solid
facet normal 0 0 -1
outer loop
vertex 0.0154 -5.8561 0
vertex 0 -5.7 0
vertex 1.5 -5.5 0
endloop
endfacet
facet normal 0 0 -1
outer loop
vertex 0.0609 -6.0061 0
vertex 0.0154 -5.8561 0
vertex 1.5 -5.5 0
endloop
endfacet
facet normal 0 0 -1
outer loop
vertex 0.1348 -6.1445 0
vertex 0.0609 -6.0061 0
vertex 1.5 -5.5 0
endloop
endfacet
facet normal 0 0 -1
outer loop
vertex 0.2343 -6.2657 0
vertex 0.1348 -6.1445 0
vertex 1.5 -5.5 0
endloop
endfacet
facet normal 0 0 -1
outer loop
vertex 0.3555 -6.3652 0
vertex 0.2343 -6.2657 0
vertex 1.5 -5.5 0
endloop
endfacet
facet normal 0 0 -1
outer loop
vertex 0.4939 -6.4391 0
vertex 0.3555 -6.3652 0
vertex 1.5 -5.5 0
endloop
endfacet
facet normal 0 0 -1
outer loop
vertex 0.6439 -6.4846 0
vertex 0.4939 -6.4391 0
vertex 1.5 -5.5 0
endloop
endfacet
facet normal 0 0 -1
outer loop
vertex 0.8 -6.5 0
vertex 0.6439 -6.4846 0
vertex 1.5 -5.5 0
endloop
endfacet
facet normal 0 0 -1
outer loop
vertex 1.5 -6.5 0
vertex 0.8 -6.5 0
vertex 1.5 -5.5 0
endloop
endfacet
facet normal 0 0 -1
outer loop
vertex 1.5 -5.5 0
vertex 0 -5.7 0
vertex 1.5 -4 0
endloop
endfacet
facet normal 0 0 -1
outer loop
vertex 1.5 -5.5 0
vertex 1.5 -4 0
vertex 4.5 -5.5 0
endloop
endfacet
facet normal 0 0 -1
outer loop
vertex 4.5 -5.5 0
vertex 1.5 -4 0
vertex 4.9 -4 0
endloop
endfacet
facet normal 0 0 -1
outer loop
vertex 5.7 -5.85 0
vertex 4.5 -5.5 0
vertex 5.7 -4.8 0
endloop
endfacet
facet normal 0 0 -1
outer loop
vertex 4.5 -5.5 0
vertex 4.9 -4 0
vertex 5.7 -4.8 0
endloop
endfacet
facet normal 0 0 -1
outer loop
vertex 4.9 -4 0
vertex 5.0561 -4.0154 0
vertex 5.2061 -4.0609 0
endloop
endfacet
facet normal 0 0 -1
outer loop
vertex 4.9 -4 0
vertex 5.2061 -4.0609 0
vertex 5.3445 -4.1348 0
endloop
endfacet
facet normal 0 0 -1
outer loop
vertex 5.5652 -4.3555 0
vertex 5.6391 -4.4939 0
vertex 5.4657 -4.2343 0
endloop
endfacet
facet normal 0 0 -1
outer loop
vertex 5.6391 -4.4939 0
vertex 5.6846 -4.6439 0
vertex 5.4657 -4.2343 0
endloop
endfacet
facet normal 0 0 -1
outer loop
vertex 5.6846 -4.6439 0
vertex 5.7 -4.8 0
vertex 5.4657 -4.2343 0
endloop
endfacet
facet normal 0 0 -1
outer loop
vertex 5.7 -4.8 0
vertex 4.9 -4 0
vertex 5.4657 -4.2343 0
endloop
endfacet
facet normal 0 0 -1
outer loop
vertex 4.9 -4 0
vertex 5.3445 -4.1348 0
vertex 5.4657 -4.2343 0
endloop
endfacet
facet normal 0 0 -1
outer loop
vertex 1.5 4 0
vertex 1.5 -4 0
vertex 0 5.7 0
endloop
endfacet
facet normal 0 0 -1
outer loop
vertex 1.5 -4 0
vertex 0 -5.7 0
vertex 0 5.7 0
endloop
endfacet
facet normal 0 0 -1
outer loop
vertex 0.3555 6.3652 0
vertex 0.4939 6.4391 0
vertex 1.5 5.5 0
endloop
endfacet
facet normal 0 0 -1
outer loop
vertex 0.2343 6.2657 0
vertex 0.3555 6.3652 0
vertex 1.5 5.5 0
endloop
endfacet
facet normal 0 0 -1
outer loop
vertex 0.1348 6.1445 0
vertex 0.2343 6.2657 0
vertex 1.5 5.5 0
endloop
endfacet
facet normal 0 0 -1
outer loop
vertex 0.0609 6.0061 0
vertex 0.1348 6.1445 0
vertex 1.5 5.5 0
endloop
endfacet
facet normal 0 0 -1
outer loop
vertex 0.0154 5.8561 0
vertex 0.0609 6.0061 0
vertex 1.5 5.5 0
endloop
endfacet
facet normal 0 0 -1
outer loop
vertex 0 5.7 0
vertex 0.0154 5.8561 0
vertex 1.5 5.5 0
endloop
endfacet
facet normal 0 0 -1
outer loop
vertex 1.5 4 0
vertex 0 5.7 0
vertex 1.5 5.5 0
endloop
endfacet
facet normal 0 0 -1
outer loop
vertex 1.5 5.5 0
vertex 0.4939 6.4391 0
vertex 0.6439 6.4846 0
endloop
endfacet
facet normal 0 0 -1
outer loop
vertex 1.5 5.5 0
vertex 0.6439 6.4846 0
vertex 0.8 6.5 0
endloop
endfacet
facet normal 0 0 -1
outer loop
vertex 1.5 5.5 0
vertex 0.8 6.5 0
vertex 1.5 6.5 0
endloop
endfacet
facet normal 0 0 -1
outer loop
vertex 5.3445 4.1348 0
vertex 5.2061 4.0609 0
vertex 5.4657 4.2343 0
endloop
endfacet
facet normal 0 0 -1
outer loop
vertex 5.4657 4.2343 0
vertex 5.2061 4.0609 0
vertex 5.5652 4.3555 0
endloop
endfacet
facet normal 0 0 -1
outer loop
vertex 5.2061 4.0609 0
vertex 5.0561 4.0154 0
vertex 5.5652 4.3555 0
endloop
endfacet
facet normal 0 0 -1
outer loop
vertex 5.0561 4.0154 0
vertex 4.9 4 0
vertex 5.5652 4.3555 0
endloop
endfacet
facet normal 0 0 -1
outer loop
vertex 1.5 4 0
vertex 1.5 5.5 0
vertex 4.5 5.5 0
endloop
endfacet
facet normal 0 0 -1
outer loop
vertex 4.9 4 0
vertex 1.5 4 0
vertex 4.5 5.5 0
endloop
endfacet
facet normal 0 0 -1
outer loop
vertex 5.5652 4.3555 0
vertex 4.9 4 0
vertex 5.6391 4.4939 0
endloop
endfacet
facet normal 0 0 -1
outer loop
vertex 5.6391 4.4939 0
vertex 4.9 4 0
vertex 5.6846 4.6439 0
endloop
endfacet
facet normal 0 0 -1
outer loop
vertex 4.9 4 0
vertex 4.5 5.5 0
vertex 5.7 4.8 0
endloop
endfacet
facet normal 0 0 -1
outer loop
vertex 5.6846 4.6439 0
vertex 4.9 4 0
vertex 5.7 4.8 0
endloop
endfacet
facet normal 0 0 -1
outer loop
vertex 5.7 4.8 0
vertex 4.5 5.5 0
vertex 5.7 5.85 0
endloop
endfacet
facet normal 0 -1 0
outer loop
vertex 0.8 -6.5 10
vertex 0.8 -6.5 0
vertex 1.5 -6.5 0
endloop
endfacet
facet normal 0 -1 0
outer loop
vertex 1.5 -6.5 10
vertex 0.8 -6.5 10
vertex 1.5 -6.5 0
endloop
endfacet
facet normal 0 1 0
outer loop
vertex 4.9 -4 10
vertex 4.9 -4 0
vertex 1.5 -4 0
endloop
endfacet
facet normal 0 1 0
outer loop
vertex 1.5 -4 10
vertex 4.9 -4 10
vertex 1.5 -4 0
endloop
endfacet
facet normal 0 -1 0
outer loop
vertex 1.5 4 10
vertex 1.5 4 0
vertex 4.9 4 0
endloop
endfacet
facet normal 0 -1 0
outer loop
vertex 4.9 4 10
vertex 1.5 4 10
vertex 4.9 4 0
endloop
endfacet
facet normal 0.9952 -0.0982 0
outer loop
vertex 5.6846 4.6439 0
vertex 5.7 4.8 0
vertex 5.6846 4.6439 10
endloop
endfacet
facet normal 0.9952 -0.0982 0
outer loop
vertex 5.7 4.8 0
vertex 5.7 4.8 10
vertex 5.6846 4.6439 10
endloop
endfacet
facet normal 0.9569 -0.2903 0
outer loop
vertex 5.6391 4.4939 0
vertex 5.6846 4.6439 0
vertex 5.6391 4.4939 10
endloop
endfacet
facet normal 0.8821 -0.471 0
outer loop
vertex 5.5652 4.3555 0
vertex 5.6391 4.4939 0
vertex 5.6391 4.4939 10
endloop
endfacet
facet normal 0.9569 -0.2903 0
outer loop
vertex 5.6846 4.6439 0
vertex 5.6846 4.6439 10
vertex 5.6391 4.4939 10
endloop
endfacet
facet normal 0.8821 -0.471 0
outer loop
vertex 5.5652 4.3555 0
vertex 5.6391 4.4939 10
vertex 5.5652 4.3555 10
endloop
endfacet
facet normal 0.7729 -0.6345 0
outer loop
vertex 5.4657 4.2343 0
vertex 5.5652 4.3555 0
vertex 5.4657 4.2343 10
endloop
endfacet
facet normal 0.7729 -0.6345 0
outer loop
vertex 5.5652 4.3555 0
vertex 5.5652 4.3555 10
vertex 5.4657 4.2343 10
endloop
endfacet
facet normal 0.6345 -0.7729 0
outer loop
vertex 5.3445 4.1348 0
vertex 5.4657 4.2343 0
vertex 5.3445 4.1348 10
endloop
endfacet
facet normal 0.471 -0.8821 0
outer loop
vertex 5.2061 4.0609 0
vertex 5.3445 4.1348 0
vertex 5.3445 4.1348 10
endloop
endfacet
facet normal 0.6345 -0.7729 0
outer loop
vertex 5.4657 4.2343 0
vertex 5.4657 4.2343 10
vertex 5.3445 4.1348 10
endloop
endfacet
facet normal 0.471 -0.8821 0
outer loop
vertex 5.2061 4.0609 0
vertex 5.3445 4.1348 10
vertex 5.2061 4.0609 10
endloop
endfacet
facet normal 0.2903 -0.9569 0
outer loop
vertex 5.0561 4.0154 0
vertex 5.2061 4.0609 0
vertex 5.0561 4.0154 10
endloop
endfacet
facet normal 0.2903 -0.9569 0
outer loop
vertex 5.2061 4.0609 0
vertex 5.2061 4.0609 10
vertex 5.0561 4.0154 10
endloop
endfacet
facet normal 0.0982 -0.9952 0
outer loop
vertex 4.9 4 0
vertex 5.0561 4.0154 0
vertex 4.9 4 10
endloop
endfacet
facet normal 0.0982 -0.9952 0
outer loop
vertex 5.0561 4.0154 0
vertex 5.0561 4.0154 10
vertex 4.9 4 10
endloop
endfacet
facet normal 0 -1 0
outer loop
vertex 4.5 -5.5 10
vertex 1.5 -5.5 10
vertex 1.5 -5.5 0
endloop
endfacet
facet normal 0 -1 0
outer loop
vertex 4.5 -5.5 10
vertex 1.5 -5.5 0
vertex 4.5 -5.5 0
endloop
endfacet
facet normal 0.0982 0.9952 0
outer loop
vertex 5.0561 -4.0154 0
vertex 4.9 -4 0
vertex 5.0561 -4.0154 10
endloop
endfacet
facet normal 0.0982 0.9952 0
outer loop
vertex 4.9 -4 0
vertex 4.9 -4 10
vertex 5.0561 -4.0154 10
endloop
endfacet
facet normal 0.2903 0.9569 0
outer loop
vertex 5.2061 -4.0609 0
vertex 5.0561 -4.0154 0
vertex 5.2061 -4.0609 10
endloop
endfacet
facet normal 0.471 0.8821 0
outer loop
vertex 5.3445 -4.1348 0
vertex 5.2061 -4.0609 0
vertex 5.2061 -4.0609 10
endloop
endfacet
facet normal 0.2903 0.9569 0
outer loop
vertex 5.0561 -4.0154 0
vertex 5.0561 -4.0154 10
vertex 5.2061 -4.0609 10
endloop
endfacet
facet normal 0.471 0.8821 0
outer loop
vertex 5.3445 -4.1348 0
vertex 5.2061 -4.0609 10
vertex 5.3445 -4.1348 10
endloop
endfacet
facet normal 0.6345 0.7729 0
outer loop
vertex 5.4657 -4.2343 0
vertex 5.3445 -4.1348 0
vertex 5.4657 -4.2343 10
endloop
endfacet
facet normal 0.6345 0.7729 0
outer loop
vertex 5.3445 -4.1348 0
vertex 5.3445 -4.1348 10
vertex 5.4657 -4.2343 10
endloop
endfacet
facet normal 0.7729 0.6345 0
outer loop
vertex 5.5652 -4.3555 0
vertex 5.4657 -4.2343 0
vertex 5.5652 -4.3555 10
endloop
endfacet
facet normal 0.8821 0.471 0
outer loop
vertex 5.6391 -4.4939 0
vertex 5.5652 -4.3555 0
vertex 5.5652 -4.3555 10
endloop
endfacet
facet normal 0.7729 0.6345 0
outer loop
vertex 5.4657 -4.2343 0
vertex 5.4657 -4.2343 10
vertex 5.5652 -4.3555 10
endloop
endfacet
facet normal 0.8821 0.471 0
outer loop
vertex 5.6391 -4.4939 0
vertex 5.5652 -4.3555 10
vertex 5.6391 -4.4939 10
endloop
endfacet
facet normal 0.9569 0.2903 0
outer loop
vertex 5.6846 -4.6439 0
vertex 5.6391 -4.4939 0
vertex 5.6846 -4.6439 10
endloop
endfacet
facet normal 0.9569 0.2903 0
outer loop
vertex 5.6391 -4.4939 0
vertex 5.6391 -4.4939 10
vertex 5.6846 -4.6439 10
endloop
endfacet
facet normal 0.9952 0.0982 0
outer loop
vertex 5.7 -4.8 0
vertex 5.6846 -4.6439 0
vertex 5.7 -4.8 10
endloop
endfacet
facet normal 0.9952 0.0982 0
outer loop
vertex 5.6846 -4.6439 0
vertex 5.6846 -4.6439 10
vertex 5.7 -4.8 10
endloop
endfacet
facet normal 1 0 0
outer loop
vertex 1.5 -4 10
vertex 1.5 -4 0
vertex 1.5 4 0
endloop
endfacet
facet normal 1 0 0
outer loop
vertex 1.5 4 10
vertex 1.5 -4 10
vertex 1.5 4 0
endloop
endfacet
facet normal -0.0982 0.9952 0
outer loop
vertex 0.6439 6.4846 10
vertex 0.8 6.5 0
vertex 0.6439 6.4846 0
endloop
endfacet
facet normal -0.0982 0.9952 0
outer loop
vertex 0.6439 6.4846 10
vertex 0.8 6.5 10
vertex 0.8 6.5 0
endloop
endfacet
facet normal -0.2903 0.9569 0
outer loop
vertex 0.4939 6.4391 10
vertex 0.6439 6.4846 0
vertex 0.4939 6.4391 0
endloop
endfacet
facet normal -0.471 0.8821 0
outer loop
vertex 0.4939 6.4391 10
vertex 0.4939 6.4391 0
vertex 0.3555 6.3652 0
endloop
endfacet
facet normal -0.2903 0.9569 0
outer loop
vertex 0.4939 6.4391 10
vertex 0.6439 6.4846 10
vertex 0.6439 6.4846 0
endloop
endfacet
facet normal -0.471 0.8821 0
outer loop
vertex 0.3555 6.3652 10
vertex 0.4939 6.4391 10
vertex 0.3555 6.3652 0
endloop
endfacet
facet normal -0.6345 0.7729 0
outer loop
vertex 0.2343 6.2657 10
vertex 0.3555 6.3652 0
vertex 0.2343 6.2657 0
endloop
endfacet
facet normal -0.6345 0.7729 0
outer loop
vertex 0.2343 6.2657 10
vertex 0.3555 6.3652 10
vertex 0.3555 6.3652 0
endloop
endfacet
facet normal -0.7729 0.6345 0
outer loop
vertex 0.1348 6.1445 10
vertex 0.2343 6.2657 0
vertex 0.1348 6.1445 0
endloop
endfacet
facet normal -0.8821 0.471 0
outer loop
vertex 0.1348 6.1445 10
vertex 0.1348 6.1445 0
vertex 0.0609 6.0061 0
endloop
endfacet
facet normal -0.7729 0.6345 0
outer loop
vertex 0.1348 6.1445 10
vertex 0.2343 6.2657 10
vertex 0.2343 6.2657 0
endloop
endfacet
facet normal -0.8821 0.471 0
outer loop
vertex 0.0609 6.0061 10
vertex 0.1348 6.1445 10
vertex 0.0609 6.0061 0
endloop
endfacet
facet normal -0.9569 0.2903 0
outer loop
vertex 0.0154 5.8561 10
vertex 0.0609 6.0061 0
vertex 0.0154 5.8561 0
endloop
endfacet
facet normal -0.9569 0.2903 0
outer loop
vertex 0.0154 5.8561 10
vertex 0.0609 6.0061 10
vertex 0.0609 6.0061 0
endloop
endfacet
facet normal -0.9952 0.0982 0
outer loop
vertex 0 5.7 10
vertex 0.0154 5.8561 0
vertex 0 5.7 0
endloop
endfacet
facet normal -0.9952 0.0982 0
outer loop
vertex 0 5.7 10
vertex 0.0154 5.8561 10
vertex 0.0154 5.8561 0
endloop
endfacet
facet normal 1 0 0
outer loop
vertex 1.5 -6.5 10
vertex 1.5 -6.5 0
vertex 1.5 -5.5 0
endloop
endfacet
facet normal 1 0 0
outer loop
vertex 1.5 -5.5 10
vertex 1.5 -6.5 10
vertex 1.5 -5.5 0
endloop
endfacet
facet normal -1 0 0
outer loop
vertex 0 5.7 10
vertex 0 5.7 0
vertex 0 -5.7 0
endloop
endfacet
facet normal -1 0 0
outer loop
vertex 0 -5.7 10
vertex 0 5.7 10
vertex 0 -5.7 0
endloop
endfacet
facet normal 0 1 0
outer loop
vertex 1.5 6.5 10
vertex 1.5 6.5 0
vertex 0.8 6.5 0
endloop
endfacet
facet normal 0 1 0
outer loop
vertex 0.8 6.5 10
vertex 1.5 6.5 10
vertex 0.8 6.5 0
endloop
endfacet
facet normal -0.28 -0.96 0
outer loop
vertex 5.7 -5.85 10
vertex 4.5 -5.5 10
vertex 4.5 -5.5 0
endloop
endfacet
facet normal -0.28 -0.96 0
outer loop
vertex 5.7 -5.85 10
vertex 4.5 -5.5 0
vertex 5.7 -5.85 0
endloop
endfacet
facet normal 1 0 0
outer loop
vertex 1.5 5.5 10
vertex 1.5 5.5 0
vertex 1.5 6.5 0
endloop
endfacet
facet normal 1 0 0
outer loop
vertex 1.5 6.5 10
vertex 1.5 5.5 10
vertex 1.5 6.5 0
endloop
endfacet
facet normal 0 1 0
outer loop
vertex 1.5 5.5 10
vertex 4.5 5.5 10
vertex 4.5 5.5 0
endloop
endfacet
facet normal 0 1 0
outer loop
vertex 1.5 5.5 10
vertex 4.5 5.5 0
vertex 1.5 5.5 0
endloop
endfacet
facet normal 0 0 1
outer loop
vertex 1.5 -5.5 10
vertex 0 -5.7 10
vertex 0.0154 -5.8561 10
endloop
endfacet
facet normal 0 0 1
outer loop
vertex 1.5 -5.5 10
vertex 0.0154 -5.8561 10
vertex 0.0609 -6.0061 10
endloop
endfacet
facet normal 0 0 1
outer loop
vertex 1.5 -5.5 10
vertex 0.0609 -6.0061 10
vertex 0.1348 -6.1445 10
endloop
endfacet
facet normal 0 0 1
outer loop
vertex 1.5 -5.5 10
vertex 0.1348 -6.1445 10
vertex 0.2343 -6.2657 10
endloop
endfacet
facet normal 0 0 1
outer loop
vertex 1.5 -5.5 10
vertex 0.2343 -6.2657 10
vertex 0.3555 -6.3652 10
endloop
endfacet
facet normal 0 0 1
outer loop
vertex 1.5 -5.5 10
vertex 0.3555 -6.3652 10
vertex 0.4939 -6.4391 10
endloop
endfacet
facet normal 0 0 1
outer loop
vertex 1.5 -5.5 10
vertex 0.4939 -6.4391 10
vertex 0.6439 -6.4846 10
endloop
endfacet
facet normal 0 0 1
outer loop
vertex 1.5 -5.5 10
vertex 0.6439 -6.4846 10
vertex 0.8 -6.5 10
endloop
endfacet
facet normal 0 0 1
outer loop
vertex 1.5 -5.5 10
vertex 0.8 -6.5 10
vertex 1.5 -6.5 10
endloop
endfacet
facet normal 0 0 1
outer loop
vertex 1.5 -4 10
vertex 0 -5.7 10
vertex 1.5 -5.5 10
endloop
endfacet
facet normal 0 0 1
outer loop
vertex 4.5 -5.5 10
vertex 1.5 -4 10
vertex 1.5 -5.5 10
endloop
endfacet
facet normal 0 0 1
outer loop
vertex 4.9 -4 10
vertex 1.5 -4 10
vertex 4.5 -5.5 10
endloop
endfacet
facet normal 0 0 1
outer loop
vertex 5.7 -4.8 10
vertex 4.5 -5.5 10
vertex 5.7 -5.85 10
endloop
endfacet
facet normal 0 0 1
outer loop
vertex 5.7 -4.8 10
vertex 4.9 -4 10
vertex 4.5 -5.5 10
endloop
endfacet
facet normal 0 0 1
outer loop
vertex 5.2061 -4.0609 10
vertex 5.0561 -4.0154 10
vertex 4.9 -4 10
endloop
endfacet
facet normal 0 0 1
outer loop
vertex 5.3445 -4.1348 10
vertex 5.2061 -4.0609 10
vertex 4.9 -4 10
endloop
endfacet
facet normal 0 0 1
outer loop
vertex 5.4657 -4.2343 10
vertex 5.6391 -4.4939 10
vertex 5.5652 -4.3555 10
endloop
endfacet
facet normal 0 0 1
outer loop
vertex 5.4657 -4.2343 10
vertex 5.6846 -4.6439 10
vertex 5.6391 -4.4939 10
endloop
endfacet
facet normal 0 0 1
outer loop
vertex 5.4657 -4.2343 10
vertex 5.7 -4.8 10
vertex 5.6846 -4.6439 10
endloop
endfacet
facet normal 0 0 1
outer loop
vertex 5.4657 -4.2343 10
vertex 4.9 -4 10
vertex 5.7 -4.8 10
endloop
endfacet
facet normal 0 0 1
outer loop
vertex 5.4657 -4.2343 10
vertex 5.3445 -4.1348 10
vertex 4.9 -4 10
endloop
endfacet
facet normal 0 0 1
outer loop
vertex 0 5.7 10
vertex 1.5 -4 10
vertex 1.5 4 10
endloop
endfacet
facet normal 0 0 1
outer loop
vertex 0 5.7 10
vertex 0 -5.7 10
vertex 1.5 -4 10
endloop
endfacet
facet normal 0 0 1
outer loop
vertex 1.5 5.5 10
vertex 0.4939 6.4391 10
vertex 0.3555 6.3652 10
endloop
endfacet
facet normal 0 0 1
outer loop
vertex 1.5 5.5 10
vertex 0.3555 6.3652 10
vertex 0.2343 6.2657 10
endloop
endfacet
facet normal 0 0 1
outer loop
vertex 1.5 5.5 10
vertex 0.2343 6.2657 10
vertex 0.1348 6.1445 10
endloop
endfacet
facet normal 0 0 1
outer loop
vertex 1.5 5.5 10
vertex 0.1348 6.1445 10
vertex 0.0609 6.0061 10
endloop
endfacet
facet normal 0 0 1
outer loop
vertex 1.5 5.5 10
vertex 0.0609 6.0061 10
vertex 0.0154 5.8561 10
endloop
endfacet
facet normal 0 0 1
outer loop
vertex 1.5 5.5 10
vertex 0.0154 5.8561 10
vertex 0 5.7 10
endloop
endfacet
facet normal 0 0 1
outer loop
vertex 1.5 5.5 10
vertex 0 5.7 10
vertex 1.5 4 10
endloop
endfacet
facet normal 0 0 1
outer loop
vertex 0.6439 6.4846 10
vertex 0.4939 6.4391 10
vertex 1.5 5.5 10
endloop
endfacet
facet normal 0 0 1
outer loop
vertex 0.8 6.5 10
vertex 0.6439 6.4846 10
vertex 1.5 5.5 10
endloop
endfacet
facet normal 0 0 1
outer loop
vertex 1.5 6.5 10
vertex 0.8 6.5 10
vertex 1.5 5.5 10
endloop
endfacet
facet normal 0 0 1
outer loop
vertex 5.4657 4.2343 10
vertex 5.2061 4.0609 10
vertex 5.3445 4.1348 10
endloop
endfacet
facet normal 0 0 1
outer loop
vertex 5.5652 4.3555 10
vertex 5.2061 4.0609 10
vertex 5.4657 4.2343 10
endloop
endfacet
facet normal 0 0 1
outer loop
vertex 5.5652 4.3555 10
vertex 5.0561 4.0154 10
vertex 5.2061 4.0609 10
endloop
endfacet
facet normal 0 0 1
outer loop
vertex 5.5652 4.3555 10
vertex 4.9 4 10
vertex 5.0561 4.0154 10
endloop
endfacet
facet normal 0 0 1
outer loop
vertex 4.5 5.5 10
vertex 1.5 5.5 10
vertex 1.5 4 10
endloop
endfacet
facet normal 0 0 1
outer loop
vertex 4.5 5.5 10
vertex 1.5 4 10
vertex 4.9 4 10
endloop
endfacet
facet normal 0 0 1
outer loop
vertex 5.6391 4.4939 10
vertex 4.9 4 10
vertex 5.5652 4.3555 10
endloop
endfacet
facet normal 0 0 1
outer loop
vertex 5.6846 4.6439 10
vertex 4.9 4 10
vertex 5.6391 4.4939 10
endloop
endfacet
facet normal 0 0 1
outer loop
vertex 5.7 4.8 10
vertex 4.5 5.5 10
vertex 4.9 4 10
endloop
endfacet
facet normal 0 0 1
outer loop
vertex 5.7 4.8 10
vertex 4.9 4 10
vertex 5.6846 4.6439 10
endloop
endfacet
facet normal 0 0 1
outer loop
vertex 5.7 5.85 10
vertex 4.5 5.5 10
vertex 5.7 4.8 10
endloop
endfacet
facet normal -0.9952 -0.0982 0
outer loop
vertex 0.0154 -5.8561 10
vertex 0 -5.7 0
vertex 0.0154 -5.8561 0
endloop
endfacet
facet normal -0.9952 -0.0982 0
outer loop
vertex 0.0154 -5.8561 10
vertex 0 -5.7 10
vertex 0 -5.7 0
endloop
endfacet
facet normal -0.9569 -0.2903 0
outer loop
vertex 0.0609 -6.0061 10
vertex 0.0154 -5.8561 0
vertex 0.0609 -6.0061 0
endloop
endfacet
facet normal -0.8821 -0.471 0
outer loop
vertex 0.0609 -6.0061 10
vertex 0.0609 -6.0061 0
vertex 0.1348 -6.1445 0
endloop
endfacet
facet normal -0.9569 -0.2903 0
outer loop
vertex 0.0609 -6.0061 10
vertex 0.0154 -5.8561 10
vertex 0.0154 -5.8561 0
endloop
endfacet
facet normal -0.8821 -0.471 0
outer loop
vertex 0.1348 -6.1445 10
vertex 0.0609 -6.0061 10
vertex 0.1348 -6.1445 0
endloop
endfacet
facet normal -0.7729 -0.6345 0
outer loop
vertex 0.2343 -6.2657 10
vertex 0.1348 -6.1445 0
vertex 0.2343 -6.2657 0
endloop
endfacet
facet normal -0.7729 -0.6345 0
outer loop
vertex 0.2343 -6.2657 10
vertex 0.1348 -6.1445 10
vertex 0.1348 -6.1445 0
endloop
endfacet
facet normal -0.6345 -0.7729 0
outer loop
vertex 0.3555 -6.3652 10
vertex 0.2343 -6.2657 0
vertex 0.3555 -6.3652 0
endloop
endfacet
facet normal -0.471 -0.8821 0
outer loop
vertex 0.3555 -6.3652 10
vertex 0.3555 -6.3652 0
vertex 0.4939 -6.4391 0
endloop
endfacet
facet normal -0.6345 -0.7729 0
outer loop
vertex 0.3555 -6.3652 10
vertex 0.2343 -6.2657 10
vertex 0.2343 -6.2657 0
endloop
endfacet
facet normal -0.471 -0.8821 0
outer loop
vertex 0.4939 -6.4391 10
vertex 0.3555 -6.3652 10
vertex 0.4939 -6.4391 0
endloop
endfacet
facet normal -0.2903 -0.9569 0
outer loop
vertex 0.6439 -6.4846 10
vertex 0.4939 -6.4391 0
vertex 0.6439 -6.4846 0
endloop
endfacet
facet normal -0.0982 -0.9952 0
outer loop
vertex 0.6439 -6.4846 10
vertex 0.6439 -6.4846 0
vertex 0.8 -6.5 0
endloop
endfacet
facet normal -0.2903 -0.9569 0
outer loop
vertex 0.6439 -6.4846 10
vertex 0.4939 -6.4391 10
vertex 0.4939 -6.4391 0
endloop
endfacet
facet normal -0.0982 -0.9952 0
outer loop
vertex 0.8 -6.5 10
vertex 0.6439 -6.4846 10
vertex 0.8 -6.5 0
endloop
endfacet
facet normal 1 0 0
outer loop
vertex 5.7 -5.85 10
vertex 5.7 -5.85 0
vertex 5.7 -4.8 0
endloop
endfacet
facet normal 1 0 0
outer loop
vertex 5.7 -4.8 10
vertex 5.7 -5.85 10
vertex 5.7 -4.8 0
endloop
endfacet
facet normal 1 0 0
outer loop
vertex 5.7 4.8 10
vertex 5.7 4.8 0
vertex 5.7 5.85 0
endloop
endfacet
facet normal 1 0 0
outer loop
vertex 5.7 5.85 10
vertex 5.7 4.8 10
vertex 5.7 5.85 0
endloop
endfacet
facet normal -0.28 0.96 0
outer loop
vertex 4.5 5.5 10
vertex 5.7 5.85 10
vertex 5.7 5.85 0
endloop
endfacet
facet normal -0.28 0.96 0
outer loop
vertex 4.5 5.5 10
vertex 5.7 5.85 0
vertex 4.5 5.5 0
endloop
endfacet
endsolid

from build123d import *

# Parameters (mm, degrees)
PAD_DEPTH   = 10
FILLET_R    = 0.8
FILLET001_R = 0.8


with BuildPart() as part:
    # Sketch → Pad (new body)
    with BuildSketch(Plane.XY):
        Polygon((5.7, -5.85), (5.7, -4), (1.5, -4), (1.5, 4), (5.7, 4), (5.7, 5.85), (4.5, 5.5), (1.5, 5.5), (1.5, 6.5), (0, 6.5), (0, -6.5), (1.5, -6.5), (1.5, -5.5), (4.5, -5.5), align=None)
    extrude(amount=PAD_DEPTH)

    # Fillet
    fillet_edges = [part.edges().sort_by_distance(p)[0] for p in [
        (0, 6.5, 5),
        (0, -6.5, 5),
    ]]
    fillet(fillet_edges, radius=FILLET_R)

    # Fillet001
    fillet001_edges = [part.edges().sort_by_distance(p)[0] for p in [
        (5.7, 4, 5),
        (5.7, -4, 5),
    ]]
    fillet(fillet001_edges, radius=FILLET001_R)


solid = part.part
